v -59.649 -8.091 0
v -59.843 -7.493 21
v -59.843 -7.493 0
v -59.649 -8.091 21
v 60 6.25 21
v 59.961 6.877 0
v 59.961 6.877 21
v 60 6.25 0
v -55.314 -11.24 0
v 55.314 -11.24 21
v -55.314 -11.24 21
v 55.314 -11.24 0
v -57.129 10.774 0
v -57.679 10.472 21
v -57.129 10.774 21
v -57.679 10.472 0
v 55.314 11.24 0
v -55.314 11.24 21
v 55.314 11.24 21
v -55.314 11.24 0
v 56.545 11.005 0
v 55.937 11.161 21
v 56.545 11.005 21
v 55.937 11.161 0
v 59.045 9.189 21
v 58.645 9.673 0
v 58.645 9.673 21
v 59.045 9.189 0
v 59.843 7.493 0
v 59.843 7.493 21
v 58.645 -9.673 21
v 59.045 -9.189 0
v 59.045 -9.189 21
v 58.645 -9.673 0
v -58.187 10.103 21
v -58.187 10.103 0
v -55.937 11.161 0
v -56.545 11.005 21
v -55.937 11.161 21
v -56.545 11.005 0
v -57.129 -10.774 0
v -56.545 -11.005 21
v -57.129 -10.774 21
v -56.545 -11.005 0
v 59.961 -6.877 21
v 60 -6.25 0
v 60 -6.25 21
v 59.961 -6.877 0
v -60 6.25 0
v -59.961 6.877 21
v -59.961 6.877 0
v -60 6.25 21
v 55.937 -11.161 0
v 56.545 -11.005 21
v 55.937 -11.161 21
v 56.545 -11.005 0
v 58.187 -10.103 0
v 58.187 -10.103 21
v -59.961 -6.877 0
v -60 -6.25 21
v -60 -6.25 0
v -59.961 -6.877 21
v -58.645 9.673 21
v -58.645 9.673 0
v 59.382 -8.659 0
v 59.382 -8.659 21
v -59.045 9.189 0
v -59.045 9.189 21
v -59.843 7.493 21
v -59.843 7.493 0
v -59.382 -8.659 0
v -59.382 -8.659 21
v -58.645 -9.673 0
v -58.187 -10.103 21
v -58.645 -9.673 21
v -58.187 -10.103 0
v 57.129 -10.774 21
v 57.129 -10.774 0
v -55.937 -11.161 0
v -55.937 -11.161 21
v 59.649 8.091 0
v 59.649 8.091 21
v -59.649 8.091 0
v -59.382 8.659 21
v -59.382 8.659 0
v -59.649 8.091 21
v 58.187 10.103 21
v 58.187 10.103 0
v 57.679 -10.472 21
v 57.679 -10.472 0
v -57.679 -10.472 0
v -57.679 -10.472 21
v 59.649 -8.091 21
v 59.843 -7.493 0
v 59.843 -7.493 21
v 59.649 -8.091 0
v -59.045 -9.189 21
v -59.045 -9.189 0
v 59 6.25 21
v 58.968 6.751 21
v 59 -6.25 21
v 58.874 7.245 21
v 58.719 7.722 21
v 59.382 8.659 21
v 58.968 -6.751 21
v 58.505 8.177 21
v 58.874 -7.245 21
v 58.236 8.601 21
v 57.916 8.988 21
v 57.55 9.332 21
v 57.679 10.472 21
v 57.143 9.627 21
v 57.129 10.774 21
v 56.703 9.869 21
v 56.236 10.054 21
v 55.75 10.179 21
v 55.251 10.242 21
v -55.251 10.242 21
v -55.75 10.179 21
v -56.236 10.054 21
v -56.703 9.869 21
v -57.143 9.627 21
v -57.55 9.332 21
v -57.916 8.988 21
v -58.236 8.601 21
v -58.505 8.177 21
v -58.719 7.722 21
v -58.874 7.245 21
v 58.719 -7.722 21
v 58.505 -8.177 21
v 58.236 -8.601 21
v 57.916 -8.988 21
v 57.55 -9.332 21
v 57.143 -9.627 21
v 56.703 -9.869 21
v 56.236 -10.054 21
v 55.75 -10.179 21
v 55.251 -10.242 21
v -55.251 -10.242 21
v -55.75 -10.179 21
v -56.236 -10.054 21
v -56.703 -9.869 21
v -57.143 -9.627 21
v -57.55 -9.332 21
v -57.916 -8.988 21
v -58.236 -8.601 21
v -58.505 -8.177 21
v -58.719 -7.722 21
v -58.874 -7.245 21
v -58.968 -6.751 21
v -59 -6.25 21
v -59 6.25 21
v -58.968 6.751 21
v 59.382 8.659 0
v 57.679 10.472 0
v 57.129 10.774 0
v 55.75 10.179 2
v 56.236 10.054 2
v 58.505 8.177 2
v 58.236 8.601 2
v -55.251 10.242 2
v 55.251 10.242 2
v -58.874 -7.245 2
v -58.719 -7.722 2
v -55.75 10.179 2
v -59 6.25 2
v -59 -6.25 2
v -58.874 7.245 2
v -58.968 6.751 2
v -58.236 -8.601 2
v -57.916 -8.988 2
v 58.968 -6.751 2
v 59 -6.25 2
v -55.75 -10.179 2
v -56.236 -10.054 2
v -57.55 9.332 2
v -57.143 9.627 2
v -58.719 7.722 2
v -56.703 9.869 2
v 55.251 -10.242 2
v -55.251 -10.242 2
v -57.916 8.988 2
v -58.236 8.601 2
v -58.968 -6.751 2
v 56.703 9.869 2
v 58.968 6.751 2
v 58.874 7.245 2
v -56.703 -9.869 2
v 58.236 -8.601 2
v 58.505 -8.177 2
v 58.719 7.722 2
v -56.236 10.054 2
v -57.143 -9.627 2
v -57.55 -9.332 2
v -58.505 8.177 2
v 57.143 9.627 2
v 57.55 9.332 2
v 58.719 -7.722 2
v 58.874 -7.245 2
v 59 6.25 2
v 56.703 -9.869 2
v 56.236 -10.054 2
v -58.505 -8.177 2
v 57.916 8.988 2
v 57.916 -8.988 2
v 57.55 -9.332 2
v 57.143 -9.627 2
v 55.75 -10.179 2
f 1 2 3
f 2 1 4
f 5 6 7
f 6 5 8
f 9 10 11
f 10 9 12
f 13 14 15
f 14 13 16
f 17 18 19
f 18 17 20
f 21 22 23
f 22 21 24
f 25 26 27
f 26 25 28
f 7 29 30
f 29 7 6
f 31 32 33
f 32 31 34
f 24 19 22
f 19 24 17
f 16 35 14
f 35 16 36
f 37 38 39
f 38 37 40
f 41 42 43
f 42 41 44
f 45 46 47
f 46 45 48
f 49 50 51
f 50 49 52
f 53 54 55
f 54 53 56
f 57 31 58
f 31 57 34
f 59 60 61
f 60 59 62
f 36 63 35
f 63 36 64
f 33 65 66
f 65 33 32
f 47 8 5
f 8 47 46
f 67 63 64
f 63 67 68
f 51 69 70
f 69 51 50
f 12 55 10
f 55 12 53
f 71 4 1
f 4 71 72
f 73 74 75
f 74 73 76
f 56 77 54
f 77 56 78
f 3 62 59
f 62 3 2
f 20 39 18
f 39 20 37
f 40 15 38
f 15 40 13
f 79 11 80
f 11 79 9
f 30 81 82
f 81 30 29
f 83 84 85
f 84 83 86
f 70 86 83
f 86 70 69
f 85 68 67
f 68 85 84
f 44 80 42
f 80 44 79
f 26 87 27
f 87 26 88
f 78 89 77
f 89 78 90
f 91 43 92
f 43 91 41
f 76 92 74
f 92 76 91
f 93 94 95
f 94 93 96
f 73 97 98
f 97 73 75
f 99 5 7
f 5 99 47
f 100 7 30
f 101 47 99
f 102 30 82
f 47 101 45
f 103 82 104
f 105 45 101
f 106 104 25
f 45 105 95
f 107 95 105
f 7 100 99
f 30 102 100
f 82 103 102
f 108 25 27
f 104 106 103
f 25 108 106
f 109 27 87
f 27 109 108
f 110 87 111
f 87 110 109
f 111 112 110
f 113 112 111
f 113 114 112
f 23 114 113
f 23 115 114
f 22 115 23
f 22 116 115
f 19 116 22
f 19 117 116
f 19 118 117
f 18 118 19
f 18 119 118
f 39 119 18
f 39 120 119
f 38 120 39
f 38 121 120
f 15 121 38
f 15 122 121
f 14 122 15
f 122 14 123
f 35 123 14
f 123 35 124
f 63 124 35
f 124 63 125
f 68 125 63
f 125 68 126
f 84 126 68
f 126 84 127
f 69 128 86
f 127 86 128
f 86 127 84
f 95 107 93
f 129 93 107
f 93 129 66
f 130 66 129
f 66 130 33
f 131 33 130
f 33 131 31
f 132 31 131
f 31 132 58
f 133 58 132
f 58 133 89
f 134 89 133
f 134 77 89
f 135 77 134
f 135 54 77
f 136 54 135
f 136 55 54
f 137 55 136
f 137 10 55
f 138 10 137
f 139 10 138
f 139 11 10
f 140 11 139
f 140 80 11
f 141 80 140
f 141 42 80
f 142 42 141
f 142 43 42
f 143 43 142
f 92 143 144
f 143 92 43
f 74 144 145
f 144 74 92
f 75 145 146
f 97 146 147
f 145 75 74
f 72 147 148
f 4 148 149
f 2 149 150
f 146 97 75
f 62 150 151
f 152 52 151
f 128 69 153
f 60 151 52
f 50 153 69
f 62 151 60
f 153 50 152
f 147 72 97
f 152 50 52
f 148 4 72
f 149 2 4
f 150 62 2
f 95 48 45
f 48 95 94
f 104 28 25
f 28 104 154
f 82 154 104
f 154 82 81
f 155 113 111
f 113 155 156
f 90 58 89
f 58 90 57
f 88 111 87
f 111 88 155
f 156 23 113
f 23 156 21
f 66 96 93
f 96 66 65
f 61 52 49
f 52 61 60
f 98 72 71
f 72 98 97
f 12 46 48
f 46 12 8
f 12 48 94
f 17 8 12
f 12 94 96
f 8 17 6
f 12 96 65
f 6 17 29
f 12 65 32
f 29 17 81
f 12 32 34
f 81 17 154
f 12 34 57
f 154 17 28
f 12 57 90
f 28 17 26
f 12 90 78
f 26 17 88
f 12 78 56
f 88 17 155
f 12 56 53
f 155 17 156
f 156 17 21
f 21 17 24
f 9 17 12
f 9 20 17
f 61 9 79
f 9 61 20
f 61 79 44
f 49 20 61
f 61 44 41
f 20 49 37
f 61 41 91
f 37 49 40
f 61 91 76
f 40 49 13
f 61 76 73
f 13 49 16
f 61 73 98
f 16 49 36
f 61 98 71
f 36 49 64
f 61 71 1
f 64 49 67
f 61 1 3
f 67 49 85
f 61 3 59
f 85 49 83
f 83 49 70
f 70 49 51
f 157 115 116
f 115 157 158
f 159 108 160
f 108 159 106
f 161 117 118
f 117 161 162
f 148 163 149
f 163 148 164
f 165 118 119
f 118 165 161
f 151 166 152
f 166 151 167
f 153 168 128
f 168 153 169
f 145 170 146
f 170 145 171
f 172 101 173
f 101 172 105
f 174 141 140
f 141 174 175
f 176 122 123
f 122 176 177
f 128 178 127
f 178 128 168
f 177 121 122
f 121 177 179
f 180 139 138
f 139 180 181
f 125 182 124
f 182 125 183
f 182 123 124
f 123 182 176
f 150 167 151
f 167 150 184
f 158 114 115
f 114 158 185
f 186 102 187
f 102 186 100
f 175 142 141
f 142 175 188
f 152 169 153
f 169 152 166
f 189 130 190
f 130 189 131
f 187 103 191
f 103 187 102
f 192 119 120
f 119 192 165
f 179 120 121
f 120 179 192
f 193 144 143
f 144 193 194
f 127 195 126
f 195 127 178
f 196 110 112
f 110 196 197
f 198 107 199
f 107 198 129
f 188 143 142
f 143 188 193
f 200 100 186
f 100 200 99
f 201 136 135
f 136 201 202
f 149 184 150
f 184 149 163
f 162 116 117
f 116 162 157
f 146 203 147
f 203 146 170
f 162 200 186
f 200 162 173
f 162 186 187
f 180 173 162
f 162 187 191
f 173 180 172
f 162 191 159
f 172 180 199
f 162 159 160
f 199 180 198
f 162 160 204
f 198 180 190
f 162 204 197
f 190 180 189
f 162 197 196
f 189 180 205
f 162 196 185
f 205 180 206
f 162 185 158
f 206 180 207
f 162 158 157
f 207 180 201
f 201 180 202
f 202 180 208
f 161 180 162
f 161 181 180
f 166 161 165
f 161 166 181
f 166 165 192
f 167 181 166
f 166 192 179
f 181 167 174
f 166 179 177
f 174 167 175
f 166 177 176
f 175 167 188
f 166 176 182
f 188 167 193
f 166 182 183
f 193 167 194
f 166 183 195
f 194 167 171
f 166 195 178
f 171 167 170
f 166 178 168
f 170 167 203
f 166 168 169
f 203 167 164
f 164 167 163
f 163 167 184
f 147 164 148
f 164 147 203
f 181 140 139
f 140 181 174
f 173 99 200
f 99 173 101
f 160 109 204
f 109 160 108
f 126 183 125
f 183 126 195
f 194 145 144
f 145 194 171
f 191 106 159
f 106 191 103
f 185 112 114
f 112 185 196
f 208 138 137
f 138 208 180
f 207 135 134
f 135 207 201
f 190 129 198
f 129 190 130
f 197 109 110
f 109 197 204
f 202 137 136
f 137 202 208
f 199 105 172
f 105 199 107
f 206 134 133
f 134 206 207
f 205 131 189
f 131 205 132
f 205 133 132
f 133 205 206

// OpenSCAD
$fn = 50;


difference() {
	union() {
		hull() {
			translate(v = [-55.0000000000, 6.2500000000, 0]) {
				cylinder(h = 21, r = 5);
			}
			translate(v = [55.0000000000, 6.2500000000, 0]) {
				cylinder(h = 21, r = 5);
			}
			translate(v = [-55.0000000000, -6.2500000000, 0]) {
				cylinder(h = 21, r = 5);
			}
			translate(v = [55.0000000000, -6.2500000000, 0]) {
				cylinder(h = 21, r = 5);
			}
		}
	}
	union() {
		translate(v = [0, 0, 2]) {
			hull() {
				translate(v = [-55.0000000000, 6.2500000000, 0]) {
					cylinder(h = 19, r = 4);
				}
				translate(v = [55.0000000000, 6.2500000000, 0]) {
					cylinder(h = 19, r = 4);
				}
				translate(v = [-55.0000000000, -6.2500000000, 0]) {
					cylinder(h = 19, r = 4);
				}
				translate(v = [55.0000000000, -6.2500000000, 0]) {
					cylinder(h = 19, r = 4);
				}
			}
		}
	}
}
